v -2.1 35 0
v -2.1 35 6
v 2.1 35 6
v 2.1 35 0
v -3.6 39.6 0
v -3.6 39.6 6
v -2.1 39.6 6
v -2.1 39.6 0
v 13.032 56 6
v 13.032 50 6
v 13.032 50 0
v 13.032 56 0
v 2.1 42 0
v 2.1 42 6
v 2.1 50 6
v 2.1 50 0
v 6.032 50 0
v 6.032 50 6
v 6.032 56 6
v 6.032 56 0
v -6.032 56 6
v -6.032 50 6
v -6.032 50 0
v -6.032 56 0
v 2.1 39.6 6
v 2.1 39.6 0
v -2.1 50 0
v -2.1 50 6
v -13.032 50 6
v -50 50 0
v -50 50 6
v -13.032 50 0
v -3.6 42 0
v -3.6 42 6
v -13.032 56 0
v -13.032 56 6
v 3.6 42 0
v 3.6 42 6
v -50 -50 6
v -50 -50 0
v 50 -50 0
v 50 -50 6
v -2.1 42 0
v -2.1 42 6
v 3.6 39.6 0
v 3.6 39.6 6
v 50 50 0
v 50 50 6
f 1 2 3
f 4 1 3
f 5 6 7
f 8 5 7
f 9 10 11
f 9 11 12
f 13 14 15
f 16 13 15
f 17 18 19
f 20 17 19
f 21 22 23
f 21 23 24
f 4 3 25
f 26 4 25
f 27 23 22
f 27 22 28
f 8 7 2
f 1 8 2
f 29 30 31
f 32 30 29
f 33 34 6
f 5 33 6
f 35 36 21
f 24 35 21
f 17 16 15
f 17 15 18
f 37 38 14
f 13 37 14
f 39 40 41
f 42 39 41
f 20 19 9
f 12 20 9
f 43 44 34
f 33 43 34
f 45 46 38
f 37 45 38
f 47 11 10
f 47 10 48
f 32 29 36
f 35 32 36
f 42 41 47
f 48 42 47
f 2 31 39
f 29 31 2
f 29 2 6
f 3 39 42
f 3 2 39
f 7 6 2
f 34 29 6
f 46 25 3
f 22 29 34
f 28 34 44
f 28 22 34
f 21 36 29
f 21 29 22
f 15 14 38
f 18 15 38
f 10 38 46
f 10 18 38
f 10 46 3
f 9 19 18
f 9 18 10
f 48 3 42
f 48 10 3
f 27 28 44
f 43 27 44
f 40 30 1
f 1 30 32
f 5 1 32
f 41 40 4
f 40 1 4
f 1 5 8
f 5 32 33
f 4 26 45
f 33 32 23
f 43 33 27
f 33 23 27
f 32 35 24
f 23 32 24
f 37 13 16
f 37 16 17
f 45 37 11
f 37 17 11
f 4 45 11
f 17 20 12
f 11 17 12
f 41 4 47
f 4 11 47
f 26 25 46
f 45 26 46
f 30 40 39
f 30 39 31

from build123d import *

# Parameters (mm, degrees)
SKETCH_1_W          = 100
SKETCH_1_H          = 100
EXTRUDE_1_DEPTH     = 6
SKETCH_2_W          = 7
SKETCH_2_H          = 6
EXTRUDE_2_DEPTH     = 6
CUT_EXTRUDE_1_DEPTH = 7


with BuildPart() as part:
    # Эскиз1 → Бобышка-Вытянуть1 (new body)
    with BuildSketch(Plane.XY):
        Rectangle(SKETCH_1_W, SKETCH_1_H)
    extrude(amount=EXTRUDE_1_DEPTH)

    # Эскиз2 → Бобышка-Вытянуть2 (add)
    with BuildSketch(Plane.XY.offset(6)):
        with Locations((-9.531849908, 53)):
            Rectangle(SKETCH_2_W, SKETCH_2_H)
        with Locations((9.531849908, 53)):
            Rectangle(SKETCH_2_W, SKETCH_2_H)
    extrude(amount=-EXTRUDE_2_DEPTH)

    # Эскиз3 → Вырез-Вытянуть1 (cut, through all)
    with BuildSketch(Plane.XY.offset(6)):
        Polygon((-2.1, 42), (-3.6, 42), (-3.6, 39.6), (-2.1, 39.6), (-2.1, 35), (2.1, 35), (2.1, 39.6), (3.6, 39.6), (3.6, 42), (2.1, 42), (2.1, 50), (-2.1, 50), align=None)
    extrude(amount=-CUT_EXTRUDE_1_DEPTH, mode=Mode.SUBTRACT)


solid = part.part
